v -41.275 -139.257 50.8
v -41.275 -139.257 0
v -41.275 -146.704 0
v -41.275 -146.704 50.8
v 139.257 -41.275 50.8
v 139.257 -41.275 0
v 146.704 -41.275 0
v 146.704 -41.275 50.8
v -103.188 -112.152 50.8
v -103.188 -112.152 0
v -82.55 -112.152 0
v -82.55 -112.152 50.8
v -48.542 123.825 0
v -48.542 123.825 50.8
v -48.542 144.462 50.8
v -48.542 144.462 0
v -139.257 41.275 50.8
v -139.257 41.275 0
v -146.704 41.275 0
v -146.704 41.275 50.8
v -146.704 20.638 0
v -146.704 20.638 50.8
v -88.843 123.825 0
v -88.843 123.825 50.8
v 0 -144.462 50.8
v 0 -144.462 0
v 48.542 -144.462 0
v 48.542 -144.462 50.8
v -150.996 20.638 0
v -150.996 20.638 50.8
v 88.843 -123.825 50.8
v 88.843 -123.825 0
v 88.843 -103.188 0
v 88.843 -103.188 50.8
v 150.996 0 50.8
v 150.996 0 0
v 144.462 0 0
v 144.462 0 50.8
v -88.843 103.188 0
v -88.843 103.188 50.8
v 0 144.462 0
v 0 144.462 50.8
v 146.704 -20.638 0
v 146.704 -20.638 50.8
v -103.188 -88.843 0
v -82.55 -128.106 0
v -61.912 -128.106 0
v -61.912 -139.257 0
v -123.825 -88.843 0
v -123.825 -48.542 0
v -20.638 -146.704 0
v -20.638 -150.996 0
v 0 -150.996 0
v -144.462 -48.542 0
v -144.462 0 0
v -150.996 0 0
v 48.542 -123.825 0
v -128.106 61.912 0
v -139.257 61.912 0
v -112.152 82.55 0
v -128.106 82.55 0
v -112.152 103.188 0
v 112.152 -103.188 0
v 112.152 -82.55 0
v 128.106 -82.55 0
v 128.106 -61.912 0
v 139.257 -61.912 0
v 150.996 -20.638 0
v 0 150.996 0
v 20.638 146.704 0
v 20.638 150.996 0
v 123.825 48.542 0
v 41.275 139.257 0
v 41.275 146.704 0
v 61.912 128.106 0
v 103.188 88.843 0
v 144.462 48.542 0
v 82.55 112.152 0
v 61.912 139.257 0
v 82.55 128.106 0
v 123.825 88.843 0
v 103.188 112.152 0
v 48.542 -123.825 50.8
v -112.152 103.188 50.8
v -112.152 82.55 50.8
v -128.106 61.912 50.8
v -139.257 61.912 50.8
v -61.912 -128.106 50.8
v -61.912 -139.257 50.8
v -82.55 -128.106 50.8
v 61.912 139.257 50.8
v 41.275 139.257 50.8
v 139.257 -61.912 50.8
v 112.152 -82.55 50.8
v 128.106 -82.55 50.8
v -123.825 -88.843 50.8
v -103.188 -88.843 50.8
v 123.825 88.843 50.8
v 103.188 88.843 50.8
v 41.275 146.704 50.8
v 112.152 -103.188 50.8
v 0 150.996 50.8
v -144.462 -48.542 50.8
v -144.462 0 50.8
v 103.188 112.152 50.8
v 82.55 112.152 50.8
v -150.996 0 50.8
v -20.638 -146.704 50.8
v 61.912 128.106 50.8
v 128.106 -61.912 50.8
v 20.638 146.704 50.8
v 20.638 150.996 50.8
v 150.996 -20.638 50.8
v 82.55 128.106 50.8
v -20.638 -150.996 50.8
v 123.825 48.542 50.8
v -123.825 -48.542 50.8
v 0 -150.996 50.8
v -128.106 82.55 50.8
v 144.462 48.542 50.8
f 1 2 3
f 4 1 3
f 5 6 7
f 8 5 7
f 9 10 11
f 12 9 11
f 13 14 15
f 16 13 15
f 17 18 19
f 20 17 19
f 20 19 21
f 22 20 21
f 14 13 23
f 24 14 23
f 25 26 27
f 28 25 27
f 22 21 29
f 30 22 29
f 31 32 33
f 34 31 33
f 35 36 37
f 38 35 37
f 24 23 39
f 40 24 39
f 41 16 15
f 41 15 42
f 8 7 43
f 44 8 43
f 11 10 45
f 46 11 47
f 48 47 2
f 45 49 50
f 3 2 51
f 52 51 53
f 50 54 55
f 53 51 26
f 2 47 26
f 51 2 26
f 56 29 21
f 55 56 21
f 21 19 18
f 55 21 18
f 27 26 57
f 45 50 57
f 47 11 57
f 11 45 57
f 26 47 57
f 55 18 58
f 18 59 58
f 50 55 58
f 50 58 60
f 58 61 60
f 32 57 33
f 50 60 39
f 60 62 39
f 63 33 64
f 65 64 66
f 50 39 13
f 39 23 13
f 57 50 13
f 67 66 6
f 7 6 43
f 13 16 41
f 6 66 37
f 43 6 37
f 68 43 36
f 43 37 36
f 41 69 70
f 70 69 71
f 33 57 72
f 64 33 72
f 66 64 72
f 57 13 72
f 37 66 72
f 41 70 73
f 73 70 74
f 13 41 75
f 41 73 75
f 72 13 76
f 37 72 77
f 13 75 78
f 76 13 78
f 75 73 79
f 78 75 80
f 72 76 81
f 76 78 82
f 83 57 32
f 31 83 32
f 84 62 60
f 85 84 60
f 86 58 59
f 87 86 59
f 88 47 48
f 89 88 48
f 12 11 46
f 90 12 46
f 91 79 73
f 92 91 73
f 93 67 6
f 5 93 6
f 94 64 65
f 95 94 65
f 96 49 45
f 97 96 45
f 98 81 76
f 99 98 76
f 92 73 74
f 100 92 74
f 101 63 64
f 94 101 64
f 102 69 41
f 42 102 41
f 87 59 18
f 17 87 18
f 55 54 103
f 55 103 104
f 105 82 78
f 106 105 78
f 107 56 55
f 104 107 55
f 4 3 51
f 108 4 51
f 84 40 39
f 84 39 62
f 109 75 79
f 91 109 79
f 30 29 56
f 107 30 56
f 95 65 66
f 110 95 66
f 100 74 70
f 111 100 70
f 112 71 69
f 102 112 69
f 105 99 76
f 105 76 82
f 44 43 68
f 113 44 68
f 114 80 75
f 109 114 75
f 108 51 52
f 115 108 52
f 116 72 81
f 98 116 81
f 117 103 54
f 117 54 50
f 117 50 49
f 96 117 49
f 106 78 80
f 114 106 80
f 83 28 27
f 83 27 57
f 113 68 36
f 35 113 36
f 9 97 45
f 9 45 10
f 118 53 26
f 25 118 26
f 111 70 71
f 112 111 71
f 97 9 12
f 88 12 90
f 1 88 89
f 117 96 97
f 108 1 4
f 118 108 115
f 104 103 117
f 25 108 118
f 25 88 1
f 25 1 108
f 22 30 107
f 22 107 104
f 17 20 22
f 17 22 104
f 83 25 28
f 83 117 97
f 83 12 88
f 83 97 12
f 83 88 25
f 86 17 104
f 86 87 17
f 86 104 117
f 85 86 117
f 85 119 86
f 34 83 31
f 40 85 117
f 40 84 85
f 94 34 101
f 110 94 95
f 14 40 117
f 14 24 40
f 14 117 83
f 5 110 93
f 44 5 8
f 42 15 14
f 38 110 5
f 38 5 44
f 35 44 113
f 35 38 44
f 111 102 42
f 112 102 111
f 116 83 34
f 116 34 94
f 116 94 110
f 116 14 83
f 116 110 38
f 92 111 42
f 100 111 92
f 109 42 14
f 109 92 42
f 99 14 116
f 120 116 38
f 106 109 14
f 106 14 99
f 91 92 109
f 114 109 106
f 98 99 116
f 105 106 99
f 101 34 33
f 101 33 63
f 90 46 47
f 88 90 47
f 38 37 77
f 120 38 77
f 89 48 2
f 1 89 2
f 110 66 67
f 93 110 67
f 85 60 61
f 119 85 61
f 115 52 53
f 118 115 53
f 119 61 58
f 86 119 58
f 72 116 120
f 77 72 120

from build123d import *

# Parameters (mm, degrees)
F0_W     = 48.542209
F0_H     = 20.6375
F0_W_2   = 20.6375
F0_H_2   = 48.542209
F1_DEPTH = 50.8


with BuildPart() as f1:
    # F0 (on Top) → F1 (new body)
    with BuildSketch(Plane.XY):
        Polygon((0, -20.6375), (0, 0), (-20.6375, 0), (-20.6375, -146.704241), (-20.6375, -150.996204), (0, -150.996204), (0, -144.4625), (0, -123.825), (0, -103.1875), (0, -82.55), (0, -61.9125), (0, -41.275), align=None)
        Polygon((20.6375, 0), (0, 0), (0, -20.6375), (146.704241, -20.6375), (150.996204, -20.6375), (150.996204, 0), (144.4625, 0), (123.825, 0), (103.1875, 0), (82.55, 0), (61.9125, 0), (41.275, 0), align=None)
        Polygon((0, 20.6375), (0, 0), (20.6375, 0), (20.6375, 146.704241), (20.6375, 150.996204), (0, 150.996204), (0, 144.4625), (0, 123.825), (0, 103.1875), (0, 82.55), (0, 61.9125), (0, 41.275), align=None)
        Polygon((-20.6375, 0), (0, 0), (0, 20.6375), (-146.704241, 20.6375), (-150.996204, 20.6375), (-150.996204, 0), (-144.4625, 0), (-123.825, 0), (-103.1875, 0), (-82.55, 0), (-61.9125, 0), (-41.275, 0), align=None)
        Polygon((-20.6375, -146.704241), (-20.6375, 0), (-41.275, 0), (-41.275, -139.257324), (-41.275, -146.704241), align=None)
        Polygon((146.704241, -20.6375), (0, -20.6375), (0, -41.275), (139.257324, -41.275), (146.704241, -41.275), align=None)
        Polygon((20.6375, 146.704241), (20.6375, 0), (41.275, 0), (41.275, 139.257324), (41.275, 146.704241), align=None)
        Polygon((-146.704241, 20.6375), (0, 20.6375), (0, 41.275), (-139.257324, 41.275), (-146.704241, 41.275), align=None)
        Polygon((-41.275, -139.257324), (-41.275, 0), (-61.9125, 0), (-61.9125, -128.10643), (-61.9125, -139.257324), align=None)
        Polygon((139.257324, -41.275), (0, -41.275), (0, -61.9125), (128.10643, -61.9125), (139.257324, -61.9125), align=None)
        Polygon((41.275, 139.257324), (41.275, 0), (61.9125, 0), (61.9125, 128.10643), (61.9125, 139.257324), align=None)
        Polygon((-139.257324, 41.275), (0, 41.275), (0, 61.9125), (-128.10643, 61.9125), (-139.257324, 61.9125), align=None)
        Polygon((-61.9125, -128.10643), (-61.9125, 0), (-82.55, 0), (-82.55, -112.152128), (-82.55, -128.10643), align=None)
        Polygon((128.10643, -61.9125), (0, -61.9125), (0, -82.55), (112.152128, -82.55), (128.10643, -82.55), align=None)
        Polygon((61.9125, 128.10643), (61.9125, 0), (82.55, 0), (82.55, 112.152128), (82.55, 128.10643), align=None)
        Polygon((-128.10643, 61.9125), (0, 61.9125), (0, 82.55), (-112.152128, 82.55), (-128.10643, 82.55), align=None)
        Polygon((-82.55, -112.152128), (-82.55, 0), (-103.1875, 0), (-103.1875, -88.843285), (-103.1875, -112.152128), align=None)
        Polygon((112.152128, -82.55), (0, -82.55), (0, -103.1875), (88.843285, -103.1875), (112.152128, -103.1875), align=None)
        Polygon((82.55, 112.152128), (82.55, 0), (103.1875, 0), (103.1875, 88.843285), (103.1875, 112.152128), align=None)
        Polygon((-112.152128, 82.55), (0, 82.55), (0, 103.1875), (-88.843285, 103.1875), (-112.152128, 103.1875), align=None)
        with Locations((24.271104, -134.14375)):
            Rectangle(F0_W, F0_H)
        Polygon((-103.1875, -88.843285), (-103.1875, 0), (-123.825, 0), (-123.825, -48.542209), (-123.825, -88.843285), align=None)
        Polygon((88.843285, -103.1875), (0, -103.1875), (0, -123.825), (48.542209, -123.825), (88.843285, -123.825), align=None)
        with Locations((134.14375, 24.271104)):
            Rectangle(F0_W_2, F0_H_2)
        Polygon((103.1875, 88.843285), (103.1875, 0), (123.825, 0), (123.825, 48.542209), (123.825, 88.843285), align=None)
        with Locations((-24.271104, 134.14375)):
            Rectangle(F0_W, F0_H)
        Polygon((-88.843285, 103.1875), (0, 103.1875), (0, 123.825), (-48.542209, 123.825), (-88.843285, 123.825), align=None)
        with Locations((-134.14375, -24.271104)):
            Rectangle(F0_W_2, F0_H_2)
    extrude(amount=F1_DEPTH)


solid = f1.part
